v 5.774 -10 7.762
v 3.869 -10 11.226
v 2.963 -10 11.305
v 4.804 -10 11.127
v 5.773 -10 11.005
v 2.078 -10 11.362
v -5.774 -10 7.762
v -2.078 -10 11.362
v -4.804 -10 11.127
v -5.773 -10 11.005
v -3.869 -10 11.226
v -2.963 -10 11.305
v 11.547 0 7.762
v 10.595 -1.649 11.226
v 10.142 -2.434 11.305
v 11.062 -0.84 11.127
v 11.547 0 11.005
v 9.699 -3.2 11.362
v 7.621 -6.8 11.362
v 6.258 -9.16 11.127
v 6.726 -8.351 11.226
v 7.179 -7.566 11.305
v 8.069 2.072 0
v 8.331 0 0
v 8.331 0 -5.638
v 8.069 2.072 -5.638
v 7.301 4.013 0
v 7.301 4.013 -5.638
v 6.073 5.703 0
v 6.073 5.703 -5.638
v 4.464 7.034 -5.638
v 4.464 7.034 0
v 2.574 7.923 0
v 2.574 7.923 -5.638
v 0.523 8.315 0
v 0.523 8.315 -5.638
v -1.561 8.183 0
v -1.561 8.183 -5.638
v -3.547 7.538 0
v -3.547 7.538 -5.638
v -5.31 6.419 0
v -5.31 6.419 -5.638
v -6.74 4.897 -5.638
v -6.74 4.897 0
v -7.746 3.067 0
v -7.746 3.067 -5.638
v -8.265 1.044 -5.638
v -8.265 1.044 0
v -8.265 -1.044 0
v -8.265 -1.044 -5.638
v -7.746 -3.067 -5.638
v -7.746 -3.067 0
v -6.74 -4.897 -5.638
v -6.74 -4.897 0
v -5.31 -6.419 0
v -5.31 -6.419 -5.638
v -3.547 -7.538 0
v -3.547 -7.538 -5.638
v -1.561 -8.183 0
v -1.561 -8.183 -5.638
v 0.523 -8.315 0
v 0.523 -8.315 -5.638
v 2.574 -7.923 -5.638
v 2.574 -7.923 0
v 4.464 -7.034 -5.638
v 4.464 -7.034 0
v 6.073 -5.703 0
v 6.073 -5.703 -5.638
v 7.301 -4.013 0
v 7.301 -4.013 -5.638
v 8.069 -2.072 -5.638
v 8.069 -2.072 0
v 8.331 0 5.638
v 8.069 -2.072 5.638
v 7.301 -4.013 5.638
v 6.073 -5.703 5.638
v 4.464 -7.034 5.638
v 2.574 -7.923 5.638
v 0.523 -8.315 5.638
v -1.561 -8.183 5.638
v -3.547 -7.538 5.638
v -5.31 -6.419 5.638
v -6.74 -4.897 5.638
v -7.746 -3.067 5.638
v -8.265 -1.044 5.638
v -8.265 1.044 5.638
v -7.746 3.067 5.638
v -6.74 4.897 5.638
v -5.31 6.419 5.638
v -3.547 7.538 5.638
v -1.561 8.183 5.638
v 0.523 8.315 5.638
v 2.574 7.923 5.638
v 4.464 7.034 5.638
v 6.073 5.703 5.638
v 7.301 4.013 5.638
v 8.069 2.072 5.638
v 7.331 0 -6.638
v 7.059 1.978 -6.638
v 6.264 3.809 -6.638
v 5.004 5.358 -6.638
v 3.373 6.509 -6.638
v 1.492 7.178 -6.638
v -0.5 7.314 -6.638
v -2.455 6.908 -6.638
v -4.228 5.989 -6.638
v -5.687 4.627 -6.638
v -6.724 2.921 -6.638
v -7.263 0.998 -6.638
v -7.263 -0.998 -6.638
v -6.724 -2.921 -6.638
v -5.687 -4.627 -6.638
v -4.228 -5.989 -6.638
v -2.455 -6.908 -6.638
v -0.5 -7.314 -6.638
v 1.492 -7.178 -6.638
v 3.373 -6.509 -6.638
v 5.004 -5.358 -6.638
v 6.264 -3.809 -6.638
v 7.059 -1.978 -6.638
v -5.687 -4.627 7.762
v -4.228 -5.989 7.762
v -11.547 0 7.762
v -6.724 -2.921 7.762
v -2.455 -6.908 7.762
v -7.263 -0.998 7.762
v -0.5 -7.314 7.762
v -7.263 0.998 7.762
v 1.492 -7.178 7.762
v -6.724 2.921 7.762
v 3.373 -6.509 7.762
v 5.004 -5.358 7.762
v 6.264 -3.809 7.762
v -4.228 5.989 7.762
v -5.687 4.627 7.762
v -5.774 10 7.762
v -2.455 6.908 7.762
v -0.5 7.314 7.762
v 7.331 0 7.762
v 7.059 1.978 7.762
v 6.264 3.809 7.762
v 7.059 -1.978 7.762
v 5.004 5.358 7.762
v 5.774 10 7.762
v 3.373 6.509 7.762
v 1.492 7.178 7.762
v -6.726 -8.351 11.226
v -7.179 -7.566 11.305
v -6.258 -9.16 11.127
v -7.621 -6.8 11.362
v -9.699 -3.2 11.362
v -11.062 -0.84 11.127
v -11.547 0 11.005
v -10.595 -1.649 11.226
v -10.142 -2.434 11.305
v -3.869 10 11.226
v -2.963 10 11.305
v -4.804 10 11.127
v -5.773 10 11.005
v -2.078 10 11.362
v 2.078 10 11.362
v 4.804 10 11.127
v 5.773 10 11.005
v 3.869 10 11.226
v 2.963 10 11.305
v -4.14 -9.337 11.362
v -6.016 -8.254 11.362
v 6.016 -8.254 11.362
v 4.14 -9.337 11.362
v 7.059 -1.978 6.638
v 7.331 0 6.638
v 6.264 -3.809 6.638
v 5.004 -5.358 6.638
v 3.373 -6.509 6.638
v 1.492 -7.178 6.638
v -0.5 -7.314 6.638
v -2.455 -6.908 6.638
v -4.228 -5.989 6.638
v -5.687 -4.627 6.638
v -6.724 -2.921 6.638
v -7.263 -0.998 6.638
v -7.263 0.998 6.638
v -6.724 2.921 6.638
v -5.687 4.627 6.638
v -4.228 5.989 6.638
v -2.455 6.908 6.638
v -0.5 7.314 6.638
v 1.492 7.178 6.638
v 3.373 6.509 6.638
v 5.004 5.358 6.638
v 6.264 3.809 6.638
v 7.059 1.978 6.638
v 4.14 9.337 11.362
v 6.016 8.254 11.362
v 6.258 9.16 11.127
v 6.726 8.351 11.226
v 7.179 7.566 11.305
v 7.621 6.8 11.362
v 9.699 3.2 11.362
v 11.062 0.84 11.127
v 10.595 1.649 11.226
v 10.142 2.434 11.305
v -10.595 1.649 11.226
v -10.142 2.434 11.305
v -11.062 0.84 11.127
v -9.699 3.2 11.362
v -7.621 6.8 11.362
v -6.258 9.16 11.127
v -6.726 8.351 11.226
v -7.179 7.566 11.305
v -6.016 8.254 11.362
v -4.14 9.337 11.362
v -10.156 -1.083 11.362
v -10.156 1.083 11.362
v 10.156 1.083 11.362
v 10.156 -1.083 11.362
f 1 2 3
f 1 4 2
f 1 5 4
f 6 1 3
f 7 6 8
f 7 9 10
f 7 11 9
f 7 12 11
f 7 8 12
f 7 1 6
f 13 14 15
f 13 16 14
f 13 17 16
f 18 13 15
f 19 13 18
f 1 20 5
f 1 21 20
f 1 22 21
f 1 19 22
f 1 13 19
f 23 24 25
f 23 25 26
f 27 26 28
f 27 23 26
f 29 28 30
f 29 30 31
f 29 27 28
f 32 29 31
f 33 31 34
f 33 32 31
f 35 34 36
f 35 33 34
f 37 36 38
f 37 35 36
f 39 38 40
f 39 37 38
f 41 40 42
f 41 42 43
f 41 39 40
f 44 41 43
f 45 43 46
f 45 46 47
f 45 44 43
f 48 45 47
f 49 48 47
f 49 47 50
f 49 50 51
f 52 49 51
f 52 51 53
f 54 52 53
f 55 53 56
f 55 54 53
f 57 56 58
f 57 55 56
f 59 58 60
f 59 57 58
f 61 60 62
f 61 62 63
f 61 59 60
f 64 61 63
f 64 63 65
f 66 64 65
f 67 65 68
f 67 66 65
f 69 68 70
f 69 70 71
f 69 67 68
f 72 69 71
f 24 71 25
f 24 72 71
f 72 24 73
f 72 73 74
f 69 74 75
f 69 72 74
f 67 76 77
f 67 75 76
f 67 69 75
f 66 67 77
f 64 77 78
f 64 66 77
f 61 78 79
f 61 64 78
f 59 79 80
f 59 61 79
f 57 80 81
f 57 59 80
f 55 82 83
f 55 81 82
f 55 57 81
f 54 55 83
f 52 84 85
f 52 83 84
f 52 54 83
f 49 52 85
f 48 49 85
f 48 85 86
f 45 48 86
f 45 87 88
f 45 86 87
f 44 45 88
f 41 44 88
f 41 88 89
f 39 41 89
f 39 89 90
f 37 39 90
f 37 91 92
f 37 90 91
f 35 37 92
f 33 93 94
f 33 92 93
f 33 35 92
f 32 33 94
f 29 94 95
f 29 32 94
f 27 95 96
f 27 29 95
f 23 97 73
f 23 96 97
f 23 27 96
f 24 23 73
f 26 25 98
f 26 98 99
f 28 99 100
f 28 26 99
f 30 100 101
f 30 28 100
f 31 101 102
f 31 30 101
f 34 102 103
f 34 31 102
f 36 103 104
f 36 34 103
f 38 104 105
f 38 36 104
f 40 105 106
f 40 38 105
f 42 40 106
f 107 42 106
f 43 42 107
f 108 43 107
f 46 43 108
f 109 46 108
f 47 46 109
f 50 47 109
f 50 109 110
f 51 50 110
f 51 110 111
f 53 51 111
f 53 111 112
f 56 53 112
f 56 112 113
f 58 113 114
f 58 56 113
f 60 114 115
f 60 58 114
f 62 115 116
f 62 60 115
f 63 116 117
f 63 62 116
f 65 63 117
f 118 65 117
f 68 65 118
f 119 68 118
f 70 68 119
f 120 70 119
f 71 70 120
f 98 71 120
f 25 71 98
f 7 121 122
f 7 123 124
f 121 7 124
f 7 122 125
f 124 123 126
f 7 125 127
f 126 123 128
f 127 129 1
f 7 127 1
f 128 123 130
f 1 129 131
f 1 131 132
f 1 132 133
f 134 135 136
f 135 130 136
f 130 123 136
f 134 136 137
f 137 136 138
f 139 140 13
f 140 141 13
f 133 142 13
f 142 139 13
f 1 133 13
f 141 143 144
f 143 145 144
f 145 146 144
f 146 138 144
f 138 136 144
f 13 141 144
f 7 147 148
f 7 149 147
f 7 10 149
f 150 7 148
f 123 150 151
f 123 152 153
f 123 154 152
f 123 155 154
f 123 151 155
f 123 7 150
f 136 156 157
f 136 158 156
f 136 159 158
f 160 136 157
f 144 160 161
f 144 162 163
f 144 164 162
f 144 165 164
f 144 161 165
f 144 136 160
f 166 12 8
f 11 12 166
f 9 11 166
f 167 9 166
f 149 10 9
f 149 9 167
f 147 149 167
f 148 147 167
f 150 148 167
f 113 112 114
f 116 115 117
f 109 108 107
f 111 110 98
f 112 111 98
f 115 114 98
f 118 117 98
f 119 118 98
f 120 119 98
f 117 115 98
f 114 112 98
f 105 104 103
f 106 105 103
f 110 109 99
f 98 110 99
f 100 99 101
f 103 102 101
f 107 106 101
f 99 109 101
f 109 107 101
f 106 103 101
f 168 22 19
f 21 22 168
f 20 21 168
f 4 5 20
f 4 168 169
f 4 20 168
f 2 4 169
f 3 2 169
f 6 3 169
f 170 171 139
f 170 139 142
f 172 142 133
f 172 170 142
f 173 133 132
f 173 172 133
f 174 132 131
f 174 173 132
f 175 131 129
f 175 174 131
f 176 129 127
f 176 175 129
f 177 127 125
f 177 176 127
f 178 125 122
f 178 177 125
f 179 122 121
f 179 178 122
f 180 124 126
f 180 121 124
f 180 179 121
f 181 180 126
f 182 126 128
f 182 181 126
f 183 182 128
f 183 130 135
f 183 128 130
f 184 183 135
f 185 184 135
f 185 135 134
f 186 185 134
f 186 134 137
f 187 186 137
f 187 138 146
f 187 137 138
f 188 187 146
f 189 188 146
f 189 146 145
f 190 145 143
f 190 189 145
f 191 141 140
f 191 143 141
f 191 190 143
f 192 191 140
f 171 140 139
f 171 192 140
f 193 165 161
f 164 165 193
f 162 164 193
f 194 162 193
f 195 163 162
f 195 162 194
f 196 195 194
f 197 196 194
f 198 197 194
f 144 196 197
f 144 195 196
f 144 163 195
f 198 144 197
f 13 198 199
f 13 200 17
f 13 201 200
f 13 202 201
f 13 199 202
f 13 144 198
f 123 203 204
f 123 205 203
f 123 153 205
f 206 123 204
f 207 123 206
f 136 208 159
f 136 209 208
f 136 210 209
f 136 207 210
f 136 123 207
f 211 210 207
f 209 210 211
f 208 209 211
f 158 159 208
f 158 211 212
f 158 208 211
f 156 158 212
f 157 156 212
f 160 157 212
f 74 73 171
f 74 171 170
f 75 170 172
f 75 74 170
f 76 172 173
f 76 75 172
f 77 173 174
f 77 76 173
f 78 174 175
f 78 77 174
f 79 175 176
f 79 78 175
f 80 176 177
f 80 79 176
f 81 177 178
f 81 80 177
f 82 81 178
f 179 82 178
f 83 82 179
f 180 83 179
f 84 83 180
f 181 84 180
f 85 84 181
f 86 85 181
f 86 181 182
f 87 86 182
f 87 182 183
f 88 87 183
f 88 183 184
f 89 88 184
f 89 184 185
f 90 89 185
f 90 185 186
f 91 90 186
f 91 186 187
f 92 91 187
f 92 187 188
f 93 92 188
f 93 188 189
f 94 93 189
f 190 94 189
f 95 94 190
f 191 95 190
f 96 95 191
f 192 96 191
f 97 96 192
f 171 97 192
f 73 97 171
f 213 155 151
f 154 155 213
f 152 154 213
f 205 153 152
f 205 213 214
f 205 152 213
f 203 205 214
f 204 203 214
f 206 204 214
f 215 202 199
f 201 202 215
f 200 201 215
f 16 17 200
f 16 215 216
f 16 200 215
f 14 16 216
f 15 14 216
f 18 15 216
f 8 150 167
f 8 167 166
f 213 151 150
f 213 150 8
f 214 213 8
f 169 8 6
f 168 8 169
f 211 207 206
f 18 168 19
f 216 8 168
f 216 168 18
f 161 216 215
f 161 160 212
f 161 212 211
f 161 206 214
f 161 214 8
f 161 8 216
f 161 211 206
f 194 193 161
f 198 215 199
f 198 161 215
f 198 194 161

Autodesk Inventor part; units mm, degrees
ref_plane "YZ Plane" through (0, 0, 0) normal (1, 0, 0) x (0, 1, 0)
ref_plane "XZ Plane" through (0, 0, 0) normal (0, 1, 0) x (-1, 0, 0)
ref_plane "XY Plane" through (0, 0, 0) normal (0, 0, 1) x (1, 0, 0)
sketch "Szkic7" plane through (0, 0, 0) normal (0, 0, 1) x (1, 0, 0)
  circle A0 centre (0, 0) radius 8.331
  dimension "d35" = 16.662
extrude "Wyciągnięcie proste2" add sketch "Szkic7" along normal mid plane 13.275
chamfer "Faza2" distance 1 angle 45 1 edges at (-8.331, 0, 6.6375)
sketch "Szkic9" plane through (0, 0, 6.6375) normal (0, 0, 1) x (1, 0, 0)
  circle A0 centre (0, 0) radius 7.331 projected
extrude "Wyciągnięcie proste3" add sketch "Szkic9" along normal blind 1.125
sketch "Szkic10" plane through (0, 0, 7.7625) normal (0, 0, 1) x (1, 0, 0)
  line L0 (-5.7735, 10) -> (5.7735, 10)
  line L1 (5.7735, 10) -> (11.547, 0)
  line L2 (11.547, 0) -> (5.7735, -10)
  line L3 (5.7735, -10) -> (-5.7735, -10)
  line L4 (-5.7735, -10) -> (-11.547, 0)
  line L5 (-11.547, 0) -> (-5.7735, 10)
  line L6 (0, 11.6634) -> (0, -11.6634) construction
  line L7 (-11.6634, 0) -> (11.6634, 0) construction
  point P0 (0, 0)
  point P1 (0, 0)
  point P2 (0, 10)
  dimension "d44" = 20
extrude "Wyciągnięcie proste4" add sketch "Szkic10" along normal blind 3.6
sketch "Szkic12" plane through (0, 0, 0) normal (0, 1, 0) x (-1, 0, 0)
  line L0 (0, -2.1463) -> (0, 12.8775) construction
  line L1 (-5.7735, 7.7625) -> (-5.7735, 11.3625) construction
  line L2 (-11.547, 11.3625) -> (-5.7735, 11.3625) construction
  line L3 (-11.547, 7.7625) -> (-11.547, 11.3625) projected
  line L4 (-11.547, 11.0052) -> (-10.2137, 11.3625)
  line L5 (-11.547, 11.3625) -> (-5.7735, 11.3625) projected
  line L6 (-11.547, 7.7625) -> (-5.7735, 7.7625) projected
  point P0 (0, 0)
  dimension "d50" = 15
  dimension "d51" = 1.3333
revolve "Obrót2" cut sketch "Szkic12" angle 360 about axis through (0, 0, -10) along (0, 0, 1)
thread "Gwint3" size "G16.662x1.337" designation "G 3/8" class "A" standard "ISO Pipe Threads" full length
chamfer "Faza3" distance 1 angle 45 1 edges at (-8.331, 0, -6.6375)
equation "\"d35\" = OD"
equation "\"d36\" = 0.7375 * L"
equation "\"d42\" = 0.0625 * L"
equation "\"d44\" = SW"
equation "\"d45\" = 0.2 * L"
equation "\"d51\" = 0.0666667 * SW"
equation "\"SzerokośćGięciaPodcięcia\" = Grubość"
equation "\"RozmiarPodcięciaNarożnika\" = 4 * Grubość"
equation "\"PromieńPrzejścia\" = PromieńGięcia"
equation "\"Rozmiar_promienia_Jacobiego\" = PromieńGięcia"
equation "\"Wielk_odstępu\" = Grubość"
equation "\"d2\" = PromieńGięcia"
equation "\"d23\" = PromieńGięcia"
equation "\"OD\" = 16.662"
equation "\"SW\" = 20"
equation "\"L\" = 18"
equation "\"Grubość\" = 1.5"
equation "\"PromieńGięcia\" = 3"
properties part number "Korek sześciokątny BSP 3/8'' L=18" material "304"
